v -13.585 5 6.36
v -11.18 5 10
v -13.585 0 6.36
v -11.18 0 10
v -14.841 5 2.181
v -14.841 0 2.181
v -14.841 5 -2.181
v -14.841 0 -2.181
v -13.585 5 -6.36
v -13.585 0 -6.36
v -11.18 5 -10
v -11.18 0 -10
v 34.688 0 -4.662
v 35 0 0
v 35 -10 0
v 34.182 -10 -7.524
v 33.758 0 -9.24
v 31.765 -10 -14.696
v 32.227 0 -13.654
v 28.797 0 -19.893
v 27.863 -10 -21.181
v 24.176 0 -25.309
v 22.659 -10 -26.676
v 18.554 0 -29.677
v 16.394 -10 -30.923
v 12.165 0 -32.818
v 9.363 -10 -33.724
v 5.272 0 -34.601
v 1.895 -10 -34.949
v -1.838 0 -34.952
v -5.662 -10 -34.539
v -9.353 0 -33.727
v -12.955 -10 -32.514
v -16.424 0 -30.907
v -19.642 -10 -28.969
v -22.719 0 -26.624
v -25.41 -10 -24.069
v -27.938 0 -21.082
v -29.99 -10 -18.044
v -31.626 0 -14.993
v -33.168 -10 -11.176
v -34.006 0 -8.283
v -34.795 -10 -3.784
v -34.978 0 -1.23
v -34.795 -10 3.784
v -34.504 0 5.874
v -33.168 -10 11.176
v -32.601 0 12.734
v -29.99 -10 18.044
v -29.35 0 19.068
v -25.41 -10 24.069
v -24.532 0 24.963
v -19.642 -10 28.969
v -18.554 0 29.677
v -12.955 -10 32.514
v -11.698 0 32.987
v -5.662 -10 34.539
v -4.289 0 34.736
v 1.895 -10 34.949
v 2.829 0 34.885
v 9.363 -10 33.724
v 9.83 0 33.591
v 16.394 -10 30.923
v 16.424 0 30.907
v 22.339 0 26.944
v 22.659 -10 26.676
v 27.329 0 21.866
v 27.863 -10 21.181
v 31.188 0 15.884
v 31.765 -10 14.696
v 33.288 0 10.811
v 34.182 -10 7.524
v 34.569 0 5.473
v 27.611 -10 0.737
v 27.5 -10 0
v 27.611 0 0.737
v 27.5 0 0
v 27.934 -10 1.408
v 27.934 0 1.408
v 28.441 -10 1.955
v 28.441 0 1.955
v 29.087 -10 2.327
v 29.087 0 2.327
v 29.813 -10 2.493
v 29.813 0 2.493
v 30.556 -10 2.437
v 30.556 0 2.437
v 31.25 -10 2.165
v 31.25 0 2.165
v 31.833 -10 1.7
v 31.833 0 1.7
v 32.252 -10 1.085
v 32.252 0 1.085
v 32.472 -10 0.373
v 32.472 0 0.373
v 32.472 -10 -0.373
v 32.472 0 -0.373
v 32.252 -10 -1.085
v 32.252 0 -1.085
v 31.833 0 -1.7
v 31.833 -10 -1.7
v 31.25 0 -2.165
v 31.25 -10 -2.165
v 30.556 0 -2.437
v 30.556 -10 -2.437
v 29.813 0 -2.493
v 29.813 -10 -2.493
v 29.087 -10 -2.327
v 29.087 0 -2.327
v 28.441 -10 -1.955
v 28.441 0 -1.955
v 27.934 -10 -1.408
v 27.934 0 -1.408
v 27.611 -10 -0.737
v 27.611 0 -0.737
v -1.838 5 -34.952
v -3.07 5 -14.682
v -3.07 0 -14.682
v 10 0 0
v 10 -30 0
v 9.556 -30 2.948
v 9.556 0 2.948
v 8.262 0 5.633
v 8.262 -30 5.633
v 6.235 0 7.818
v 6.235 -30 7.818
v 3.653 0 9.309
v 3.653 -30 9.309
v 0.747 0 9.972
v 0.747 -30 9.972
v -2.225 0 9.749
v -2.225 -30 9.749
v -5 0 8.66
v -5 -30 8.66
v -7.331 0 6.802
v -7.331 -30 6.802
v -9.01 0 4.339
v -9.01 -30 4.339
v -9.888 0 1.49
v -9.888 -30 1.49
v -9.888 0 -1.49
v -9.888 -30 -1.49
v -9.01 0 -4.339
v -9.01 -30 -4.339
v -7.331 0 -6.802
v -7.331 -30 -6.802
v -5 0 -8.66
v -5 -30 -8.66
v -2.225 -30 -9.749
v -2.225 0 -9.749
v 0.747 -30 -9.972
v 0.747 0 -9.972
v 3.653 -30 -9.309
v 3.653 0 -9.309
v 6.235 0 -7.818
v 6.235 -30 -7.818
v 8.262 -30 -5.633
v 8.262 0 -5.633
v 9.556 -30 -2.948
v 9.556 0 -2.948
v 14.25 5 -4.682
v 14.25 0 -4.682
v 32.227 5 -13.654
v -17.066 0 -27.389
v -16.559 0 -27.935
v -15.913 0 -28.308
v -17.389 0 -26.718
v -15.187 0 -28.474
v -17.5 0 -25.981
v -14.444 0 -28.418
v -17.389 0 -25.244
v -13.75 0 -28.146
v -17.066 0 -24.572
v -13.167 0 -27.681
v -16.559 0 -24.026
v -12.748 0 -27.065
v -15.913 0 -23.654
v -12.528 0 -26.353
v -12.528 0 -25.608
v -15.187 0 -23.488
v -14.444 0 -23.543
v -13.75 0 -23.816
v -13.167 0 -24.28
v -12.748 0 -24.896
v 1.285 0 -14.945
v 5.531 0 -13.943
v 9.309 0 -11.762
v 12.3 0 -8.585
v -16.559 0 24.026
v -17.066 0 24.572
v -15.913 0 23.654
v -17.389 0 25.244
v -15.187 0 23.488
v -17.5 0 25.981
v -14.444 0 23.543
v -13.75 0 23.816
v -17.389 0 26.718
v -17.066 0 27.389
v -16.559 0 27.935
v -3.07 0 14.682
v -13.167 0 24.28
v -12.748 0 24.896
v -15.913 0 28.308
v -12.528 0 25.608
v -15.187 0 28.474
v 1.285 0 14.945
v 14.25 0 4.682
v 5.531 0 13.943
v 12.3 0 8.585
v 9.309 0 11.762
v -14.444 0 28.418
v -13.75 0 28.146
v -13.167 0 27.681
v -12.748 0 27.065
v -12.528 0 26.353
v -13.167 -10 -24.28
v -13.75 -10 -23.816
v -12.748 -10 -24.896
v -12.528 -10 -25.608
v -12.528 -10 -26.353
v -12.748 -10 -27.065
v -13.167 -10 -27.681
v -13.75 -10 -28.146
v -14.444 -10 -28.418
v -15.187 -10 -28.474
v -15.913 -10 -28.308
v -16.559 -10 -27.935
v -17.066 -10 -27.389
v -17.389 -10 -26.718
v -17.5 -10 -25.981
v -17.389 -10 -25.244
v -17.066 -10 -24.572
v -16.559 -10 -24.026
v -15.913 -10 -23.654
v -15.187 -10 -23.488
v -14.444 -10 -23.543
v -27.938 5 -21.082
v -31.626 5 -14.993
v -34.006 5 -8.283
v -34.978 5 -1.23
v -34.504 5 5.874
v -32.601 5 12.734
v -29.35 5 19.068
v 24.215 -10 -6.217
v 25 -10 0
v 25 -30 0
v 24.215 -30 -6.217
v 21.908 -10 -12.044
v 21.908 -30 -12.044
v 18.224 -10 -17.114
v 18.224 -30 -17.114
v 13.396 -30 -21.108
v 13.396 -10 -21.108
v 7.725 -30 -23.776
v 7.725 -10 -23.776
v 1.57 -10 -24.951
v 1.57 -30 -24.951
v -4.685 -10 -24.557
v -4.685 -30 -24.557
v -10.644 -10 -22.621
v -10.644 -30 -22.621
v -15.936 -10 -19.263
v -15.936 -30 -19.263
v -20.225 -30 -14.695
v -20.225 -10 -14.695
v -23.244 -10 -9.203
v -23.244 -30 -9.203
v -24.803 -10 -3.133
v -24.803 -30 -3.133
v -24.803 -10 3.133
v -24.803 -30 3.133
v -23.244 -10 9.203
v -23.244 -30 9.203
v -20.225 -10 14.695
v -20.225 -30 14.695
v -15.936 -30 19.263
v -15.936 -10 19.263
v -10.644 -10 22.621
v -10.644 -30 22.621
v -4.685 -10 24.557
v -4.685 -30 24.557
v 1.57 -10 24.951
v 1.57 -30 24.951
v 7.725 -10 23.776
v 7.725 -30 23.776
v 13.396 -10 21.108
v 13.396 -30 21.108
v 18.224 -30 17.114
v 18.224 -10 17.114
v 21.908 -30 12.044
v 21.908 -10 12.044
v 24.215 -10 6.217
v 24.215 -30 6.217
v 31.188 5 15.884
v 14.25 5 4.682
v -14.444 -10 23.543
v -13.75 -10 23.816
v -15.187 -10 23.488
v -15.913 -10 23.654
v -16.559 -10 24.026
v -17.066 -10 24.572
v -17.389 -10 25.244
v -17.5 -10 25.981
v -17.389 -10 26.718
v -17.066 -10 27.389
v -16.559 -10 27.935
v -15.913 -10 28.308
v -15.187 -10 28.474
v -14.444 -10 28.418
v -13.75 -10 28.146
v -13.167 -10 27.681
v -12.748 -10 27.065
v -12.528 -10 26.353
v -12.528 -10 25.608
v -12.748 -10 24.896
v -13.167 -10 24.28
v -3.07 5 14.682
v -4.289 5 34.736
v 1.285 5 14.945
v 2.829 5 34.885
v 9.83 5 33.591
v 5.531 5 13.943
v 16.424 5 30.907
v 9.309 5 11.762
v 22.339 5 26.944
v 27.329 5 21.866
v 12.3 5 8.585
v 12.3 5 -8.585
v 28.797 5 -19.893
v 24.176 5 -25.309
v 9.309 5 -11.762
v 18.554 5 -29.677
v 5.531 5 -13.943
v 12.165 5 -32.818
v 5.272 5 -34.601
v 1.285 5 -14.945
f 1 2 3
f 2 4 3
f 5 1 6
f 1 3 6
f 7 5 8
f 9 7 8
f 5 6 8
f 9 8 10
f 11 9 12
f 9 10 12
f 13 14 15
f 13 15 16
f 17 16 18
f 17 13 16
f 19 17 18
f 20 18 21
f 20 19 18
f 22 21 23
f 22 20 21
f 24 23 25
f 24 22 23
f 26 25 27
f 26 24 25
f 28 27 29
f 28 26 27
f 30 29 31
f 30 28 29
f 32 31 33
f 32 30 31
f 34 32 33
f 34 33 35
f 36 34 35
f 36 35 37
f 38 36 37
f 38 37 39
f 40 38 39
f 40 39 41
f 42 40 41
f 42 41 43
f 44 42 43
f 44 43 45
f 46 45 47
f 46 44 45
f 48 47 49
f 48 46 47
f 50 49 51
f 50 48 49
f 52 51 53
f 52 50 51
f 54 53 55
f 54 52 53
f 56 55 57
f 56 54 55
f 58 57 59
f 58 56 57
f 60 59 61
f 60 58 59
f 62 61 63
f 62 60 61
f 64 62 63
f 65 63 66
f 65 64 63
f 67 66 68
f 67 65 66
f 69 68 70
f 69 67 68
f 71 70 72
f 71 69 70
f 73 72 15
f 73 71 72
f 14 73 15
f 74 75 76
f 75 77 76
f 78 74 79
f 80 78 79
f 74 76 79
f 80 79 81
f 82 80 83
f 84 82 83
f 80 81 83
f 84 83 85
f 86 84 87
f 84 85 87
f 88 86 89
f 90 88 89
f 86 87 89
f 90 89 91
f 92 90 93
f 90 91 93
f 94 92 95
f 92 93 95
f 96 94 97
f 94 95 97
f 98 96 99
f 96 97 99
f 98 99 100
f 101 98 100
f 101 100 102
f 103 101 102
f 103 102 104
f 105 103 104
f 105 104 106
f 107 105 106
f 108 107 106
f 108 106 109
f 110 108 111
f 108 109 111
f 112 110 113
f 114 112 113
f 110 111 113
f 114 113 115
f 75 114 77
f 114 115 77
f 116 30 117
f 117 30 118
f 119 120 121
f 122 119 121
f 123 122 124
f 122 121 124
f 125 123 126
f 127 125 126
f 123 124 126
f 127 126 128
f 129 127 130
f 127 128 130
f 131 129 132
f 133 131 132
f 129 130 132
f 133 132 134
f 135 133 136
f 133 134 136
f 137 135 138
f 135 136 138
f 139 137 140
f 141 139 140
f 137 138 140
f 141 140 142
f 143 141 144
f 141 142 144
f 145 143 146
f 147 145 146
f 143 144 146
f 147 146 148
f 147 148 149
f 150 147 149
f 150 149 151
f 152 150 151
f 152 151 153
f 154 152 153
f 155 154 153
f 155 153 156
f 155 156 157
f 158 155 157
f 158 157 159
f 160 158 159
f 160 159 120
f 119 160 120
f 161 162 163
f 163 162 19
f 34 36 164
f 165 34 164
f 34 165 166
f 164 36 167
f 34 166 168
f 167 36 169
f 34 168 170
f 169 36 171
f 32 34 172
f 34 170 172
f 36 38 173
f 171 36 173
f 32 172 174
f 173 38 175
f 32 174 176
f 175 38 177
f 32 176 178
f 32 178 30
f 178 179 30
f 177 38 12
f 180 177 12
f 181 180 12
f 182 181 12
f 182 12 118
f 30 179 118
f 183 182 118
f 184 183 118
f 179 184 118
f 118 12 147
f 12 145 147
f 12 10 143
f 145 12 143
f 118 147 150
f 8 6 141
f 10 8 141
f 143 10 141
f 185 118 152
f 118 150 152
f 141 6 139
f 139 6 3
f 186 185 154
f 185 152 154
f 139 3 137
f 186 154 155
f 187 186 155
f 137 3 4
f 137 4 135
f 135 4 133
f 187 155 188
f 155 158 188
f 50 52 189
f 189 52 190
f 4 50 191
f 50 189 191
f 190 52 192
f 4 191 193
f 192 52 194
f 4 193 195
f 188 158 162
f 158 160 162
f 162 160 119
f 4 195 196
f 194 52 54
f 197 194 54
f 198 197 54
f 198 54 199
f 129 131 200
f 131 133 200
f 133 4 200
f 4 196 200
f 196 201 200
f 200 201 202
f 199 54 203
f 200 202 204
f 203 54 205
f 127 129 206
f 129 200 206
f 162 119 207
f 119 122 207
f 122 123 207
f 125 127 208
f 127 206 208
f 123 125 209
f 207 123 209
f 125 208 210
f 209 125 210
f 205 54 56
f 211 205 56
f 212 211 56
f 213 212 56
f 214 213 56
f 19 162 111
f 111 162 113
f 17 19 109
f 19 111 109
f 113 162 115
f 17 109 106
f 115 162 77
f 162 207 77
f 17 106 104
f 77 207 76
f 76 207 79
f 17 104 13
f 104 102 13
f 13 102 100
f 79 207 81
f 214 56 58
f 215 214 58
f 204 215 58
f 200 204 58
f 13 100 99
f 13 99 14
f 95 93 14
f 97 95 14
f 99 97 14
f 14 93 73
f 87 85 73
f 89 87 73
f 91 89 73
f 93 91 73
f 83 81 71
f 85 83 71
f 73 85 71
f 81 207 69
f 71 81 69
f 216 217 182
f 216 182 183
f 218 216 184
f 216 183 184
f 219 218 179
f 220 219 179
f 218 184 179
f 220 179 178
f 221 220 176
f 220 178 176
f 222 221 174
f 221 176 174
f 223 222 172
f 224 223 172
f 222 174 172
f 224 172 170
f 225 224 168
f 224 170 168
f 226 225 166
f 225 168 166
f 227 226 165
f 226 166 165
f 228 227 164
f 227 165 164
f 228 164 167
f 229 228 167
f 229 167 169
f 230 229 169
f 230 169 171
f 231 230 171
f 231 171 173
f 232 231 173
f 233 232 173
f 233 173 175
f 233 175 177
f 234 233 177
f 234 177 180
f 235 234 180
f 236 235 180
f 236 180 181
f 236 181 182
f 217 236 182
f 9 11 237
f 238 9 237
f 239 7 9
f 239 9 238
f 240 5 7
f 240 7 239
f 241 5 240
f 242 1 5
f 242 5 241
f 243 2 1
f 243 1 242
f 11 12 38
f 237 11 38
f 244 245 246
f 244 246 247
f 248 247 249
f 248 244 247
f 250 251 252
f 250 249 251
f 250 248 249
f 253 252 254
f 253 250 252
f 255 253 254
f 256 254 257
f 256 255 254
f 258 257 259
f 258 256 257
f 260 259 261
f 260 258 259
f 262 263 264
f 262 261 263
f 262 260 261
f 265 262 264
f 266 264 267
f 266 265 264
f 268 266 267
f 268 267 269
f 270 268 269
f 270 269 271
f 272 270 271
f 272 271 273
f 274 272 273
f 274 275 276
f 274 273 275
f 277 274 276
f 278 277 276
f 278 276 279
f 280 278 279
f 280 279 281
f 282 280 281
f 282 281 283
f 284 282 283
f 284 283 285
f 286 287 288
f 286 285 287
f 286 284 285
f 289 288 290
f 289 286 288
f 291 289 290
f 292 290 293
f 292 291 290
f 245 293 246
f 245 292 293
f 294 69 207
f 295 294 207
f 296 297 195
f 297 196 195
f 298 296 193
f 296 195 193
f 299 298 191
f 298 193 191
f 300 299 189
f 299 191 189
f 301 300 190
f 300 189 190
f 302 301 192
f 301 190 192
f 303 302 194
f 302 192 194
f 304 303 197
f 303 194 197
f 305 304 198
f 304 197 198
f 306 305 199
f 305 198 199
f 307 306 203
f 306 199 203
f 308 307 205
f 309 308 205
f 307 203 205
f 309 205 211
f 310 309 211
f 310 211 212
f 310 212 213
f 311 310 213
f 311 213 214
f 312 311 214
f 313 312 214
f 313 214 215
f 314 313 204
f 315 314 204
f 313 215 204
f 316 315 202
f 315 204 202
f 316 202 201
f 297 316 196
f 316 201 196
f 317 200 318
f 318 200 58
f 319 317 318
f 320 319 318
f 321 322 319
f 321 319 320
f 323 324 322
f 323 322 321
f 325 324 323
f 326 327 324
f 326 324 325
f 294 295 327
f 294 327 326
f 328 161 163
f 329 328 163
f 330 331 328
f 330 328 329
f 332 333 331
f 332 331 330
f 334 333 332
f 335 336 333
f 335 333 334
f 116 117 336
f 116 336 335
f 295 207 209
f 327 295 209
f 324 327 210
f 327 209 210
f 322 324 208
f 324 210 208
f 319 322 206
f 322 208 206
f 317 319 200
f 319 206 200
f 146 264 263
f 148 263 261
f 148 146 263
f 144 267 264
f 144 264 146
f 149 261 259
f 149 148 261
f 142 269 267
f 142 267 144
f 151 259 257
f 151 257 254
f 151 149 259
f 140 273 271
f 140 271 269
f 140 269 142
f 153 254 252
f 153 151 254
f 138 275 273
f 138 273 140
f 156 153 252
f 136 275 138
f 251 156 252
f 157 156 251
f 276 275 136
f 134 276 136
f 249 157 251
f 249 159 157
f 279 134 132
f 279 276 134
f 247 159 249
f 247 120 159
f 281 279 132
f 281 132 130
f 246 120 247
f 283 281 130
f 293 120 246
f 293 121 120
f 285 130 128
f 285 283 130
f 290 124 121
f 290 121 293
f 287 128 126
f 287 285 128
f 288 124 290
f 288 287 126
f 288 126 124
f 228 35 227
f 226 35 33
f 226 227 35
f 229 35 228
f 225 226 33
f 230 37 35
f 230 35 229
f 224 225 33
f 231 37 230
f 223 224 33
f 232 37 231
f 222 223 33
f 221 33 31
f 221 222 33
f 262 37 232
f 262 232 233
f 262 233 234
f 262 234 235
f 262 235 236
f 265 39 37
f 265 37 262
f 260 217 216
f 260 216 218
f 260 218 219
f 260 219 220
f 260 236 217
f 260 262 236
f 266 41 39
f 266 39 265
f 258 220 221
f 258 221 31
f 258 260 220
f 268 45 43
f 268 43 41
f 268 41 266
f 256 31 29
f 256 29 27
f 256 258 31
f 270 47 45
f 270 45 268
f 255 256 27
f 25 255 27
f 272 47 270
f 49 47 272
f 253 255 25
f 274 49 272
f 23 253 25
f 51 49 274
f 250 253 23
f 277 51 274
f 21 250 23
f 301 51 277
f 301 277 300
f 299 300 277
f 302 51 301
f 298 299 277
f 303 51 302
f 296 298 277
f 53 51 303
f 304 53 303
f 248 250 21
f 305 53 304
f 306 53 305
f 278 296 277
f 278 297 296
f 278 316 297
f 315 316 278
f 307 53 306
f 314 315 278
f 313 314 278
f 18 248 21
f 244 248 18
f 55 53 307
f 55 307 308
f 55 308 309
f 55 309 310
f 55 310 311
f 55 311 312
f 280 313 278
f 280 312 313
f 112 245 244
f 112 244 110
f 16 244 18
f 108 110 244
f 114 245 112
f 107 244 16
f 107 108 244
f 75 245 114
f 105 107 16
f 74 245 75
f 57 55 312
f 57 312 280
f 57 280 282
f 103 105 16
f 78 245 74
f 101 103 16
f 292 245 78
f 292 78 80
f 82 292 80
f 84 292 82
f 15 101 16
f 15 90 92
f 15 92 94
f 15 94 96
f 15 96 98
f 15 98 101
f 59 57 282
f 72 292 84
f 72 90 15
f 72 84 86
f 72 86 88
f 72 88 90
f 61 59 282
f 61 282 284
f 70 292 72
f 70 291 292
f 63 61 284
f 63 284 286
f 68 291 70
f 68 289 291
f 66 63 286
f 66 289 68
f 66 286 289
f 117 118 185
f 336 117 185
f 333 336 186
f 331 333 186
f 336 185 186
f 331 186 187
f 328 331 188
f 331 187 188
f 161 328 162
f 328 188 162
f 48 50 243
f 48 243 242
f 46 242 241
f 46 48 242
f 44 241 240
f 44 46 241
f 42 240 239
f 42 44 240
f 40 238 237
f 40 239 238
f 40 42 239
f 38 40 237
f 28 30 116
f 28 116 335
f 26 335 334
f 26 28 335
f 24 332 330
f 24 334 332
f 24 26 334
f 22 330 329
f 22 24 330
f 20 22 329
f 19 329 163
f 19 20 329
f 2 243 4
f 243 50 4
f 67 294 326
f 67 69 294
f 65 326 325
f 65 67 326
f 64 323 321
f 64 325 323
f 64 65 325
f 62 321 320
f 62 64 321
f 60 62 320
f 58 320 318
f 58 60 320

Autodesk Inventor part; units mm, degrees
ref_plane "YZ Plane" through (0, 0, 0) normal (1, 0, 0) x (0, 1, 0)
ref_plane "XZ Plane" through (0, 0, 0) normal (0, 1, 0) x (-1, 0, 0)
ref_plane "XY Plane" through (0, 0, 0) normal (0, 0, 1) x (1, 0, 0)
sketch "Sketch1" plane through (0, 0, 0) normal (0, 0, 1) x (1, 0, 0)
  line L0 (10, 0) -> (35, 0)
  line L1 (35, 0) -> (35, -10)
  line L2 (35, -10) -> (25, -10)
  line L3 (25, -10) -> (25, -30)
  line L4 (25, -30) -> (10, -30)
  line L5 (10, -30) -> (10, 0)
  line L6 (0, 0) -> (0, -47.182838) construction
  dimension "d0" = 10
  dimension "d1" = 20
  dimension "d2" = 35
  dimension "d3" = 10
  dimension "d4" = 10
  dimension "d5" = 0
sketch "Sketch1 outline for Revolution1" plane through (0, 0, 0) normal (0, 0, 1) x (1, 0, 0)
  line L0 (10, 0) -> (10, -30)
  line L1 (35, 0) -> (10, 0)
  line L2 (35, -10) -> (35, 0)
  line L3 (25, -10) -> (35, -10)
  line L4 (25, -30) -> (25, -10)
  line L5 (10, -30) -> (25, -30)
revolve "Revolution1" add sketch "Sketch1 outline for Revolution1" angle 360 about axis through (0, 0, 0) along (0, -1, 0)
sketch "Sketch2" plane through (0, 0, 0) normal (0, 1, 0) x (-1, 0, 0)
  circle A0 centre (0, 0) radius 35
  arc A1 (11.18034, -10) -> (11.18034, 10) centre (0, 0) ccw
  line L0 (11.18034, 10) -> (29.349814, 19.067995)
  circle A2 centre (0, 0) radius 35
  line L1 (11.18034, -10) -> (27.938175, -21.082182)
  arc A3 (27.977577, -21.108239) -> (29.6661, 19.225846) centre (0, 0.265385) ccw
  circle A4 centre (0, 0) radius 10
  dimension "d7" = 30
  dimension "d8" = 60
sketch "Sketch2 outline for Extrusion1" plane through (0, 0, 0) normal (0, 1, 0) x (-1, 0, 0)
  arc A0 (11.18034, 10) -> (11.18034, -10) centre (0, 0) cw
  line L0 (29.349814, 19.067995) -> (11.18034, 10)
  arc A1 (27.938175, -21.082182) -> (29.349814, 19.067995) centre (0, 0) ccw
  line L1 (11.18034, -10) -> (27.938175, -21.082182)
extrude "Extrusion1" add sketch "Sketch2 outline for Extrusion1" along normal blind 5
sketch "Sketch3" plane through (0, 0, 0) normal (0, 1, 0) x (-1, 0, 0)
  circle A0 centre (-30, 0) radius 2.5
  point P0 (0, 0)
  dimension "d11" = 5
  dimension "d12" = 30
sketch "Sketch3 outline for Extrusion2" plane through (0, 0, 0) normal (0, 1, 0) x (-1, 0, 0)
  circle A0 centre (-30, 0) radius 2.5
extrude "Extrusion2" cut sketch "Sketch3 outline for Extrusion2" against normal blind 10
pattern_circular "Circular Pattern1" count 3 over 360 about axis through (0, -15, 0) along (0, -1, 0) of "Extrusion1"
pattern_circular "Circular Pattern2" count 3 over 360 about axis through (0, -15, 0) along (0, -1, 0) of "Extrusion2"
properties part number "P01_Marcos_Uriel_Martinez_Ortiz2" material "Steel ASTM A36"
